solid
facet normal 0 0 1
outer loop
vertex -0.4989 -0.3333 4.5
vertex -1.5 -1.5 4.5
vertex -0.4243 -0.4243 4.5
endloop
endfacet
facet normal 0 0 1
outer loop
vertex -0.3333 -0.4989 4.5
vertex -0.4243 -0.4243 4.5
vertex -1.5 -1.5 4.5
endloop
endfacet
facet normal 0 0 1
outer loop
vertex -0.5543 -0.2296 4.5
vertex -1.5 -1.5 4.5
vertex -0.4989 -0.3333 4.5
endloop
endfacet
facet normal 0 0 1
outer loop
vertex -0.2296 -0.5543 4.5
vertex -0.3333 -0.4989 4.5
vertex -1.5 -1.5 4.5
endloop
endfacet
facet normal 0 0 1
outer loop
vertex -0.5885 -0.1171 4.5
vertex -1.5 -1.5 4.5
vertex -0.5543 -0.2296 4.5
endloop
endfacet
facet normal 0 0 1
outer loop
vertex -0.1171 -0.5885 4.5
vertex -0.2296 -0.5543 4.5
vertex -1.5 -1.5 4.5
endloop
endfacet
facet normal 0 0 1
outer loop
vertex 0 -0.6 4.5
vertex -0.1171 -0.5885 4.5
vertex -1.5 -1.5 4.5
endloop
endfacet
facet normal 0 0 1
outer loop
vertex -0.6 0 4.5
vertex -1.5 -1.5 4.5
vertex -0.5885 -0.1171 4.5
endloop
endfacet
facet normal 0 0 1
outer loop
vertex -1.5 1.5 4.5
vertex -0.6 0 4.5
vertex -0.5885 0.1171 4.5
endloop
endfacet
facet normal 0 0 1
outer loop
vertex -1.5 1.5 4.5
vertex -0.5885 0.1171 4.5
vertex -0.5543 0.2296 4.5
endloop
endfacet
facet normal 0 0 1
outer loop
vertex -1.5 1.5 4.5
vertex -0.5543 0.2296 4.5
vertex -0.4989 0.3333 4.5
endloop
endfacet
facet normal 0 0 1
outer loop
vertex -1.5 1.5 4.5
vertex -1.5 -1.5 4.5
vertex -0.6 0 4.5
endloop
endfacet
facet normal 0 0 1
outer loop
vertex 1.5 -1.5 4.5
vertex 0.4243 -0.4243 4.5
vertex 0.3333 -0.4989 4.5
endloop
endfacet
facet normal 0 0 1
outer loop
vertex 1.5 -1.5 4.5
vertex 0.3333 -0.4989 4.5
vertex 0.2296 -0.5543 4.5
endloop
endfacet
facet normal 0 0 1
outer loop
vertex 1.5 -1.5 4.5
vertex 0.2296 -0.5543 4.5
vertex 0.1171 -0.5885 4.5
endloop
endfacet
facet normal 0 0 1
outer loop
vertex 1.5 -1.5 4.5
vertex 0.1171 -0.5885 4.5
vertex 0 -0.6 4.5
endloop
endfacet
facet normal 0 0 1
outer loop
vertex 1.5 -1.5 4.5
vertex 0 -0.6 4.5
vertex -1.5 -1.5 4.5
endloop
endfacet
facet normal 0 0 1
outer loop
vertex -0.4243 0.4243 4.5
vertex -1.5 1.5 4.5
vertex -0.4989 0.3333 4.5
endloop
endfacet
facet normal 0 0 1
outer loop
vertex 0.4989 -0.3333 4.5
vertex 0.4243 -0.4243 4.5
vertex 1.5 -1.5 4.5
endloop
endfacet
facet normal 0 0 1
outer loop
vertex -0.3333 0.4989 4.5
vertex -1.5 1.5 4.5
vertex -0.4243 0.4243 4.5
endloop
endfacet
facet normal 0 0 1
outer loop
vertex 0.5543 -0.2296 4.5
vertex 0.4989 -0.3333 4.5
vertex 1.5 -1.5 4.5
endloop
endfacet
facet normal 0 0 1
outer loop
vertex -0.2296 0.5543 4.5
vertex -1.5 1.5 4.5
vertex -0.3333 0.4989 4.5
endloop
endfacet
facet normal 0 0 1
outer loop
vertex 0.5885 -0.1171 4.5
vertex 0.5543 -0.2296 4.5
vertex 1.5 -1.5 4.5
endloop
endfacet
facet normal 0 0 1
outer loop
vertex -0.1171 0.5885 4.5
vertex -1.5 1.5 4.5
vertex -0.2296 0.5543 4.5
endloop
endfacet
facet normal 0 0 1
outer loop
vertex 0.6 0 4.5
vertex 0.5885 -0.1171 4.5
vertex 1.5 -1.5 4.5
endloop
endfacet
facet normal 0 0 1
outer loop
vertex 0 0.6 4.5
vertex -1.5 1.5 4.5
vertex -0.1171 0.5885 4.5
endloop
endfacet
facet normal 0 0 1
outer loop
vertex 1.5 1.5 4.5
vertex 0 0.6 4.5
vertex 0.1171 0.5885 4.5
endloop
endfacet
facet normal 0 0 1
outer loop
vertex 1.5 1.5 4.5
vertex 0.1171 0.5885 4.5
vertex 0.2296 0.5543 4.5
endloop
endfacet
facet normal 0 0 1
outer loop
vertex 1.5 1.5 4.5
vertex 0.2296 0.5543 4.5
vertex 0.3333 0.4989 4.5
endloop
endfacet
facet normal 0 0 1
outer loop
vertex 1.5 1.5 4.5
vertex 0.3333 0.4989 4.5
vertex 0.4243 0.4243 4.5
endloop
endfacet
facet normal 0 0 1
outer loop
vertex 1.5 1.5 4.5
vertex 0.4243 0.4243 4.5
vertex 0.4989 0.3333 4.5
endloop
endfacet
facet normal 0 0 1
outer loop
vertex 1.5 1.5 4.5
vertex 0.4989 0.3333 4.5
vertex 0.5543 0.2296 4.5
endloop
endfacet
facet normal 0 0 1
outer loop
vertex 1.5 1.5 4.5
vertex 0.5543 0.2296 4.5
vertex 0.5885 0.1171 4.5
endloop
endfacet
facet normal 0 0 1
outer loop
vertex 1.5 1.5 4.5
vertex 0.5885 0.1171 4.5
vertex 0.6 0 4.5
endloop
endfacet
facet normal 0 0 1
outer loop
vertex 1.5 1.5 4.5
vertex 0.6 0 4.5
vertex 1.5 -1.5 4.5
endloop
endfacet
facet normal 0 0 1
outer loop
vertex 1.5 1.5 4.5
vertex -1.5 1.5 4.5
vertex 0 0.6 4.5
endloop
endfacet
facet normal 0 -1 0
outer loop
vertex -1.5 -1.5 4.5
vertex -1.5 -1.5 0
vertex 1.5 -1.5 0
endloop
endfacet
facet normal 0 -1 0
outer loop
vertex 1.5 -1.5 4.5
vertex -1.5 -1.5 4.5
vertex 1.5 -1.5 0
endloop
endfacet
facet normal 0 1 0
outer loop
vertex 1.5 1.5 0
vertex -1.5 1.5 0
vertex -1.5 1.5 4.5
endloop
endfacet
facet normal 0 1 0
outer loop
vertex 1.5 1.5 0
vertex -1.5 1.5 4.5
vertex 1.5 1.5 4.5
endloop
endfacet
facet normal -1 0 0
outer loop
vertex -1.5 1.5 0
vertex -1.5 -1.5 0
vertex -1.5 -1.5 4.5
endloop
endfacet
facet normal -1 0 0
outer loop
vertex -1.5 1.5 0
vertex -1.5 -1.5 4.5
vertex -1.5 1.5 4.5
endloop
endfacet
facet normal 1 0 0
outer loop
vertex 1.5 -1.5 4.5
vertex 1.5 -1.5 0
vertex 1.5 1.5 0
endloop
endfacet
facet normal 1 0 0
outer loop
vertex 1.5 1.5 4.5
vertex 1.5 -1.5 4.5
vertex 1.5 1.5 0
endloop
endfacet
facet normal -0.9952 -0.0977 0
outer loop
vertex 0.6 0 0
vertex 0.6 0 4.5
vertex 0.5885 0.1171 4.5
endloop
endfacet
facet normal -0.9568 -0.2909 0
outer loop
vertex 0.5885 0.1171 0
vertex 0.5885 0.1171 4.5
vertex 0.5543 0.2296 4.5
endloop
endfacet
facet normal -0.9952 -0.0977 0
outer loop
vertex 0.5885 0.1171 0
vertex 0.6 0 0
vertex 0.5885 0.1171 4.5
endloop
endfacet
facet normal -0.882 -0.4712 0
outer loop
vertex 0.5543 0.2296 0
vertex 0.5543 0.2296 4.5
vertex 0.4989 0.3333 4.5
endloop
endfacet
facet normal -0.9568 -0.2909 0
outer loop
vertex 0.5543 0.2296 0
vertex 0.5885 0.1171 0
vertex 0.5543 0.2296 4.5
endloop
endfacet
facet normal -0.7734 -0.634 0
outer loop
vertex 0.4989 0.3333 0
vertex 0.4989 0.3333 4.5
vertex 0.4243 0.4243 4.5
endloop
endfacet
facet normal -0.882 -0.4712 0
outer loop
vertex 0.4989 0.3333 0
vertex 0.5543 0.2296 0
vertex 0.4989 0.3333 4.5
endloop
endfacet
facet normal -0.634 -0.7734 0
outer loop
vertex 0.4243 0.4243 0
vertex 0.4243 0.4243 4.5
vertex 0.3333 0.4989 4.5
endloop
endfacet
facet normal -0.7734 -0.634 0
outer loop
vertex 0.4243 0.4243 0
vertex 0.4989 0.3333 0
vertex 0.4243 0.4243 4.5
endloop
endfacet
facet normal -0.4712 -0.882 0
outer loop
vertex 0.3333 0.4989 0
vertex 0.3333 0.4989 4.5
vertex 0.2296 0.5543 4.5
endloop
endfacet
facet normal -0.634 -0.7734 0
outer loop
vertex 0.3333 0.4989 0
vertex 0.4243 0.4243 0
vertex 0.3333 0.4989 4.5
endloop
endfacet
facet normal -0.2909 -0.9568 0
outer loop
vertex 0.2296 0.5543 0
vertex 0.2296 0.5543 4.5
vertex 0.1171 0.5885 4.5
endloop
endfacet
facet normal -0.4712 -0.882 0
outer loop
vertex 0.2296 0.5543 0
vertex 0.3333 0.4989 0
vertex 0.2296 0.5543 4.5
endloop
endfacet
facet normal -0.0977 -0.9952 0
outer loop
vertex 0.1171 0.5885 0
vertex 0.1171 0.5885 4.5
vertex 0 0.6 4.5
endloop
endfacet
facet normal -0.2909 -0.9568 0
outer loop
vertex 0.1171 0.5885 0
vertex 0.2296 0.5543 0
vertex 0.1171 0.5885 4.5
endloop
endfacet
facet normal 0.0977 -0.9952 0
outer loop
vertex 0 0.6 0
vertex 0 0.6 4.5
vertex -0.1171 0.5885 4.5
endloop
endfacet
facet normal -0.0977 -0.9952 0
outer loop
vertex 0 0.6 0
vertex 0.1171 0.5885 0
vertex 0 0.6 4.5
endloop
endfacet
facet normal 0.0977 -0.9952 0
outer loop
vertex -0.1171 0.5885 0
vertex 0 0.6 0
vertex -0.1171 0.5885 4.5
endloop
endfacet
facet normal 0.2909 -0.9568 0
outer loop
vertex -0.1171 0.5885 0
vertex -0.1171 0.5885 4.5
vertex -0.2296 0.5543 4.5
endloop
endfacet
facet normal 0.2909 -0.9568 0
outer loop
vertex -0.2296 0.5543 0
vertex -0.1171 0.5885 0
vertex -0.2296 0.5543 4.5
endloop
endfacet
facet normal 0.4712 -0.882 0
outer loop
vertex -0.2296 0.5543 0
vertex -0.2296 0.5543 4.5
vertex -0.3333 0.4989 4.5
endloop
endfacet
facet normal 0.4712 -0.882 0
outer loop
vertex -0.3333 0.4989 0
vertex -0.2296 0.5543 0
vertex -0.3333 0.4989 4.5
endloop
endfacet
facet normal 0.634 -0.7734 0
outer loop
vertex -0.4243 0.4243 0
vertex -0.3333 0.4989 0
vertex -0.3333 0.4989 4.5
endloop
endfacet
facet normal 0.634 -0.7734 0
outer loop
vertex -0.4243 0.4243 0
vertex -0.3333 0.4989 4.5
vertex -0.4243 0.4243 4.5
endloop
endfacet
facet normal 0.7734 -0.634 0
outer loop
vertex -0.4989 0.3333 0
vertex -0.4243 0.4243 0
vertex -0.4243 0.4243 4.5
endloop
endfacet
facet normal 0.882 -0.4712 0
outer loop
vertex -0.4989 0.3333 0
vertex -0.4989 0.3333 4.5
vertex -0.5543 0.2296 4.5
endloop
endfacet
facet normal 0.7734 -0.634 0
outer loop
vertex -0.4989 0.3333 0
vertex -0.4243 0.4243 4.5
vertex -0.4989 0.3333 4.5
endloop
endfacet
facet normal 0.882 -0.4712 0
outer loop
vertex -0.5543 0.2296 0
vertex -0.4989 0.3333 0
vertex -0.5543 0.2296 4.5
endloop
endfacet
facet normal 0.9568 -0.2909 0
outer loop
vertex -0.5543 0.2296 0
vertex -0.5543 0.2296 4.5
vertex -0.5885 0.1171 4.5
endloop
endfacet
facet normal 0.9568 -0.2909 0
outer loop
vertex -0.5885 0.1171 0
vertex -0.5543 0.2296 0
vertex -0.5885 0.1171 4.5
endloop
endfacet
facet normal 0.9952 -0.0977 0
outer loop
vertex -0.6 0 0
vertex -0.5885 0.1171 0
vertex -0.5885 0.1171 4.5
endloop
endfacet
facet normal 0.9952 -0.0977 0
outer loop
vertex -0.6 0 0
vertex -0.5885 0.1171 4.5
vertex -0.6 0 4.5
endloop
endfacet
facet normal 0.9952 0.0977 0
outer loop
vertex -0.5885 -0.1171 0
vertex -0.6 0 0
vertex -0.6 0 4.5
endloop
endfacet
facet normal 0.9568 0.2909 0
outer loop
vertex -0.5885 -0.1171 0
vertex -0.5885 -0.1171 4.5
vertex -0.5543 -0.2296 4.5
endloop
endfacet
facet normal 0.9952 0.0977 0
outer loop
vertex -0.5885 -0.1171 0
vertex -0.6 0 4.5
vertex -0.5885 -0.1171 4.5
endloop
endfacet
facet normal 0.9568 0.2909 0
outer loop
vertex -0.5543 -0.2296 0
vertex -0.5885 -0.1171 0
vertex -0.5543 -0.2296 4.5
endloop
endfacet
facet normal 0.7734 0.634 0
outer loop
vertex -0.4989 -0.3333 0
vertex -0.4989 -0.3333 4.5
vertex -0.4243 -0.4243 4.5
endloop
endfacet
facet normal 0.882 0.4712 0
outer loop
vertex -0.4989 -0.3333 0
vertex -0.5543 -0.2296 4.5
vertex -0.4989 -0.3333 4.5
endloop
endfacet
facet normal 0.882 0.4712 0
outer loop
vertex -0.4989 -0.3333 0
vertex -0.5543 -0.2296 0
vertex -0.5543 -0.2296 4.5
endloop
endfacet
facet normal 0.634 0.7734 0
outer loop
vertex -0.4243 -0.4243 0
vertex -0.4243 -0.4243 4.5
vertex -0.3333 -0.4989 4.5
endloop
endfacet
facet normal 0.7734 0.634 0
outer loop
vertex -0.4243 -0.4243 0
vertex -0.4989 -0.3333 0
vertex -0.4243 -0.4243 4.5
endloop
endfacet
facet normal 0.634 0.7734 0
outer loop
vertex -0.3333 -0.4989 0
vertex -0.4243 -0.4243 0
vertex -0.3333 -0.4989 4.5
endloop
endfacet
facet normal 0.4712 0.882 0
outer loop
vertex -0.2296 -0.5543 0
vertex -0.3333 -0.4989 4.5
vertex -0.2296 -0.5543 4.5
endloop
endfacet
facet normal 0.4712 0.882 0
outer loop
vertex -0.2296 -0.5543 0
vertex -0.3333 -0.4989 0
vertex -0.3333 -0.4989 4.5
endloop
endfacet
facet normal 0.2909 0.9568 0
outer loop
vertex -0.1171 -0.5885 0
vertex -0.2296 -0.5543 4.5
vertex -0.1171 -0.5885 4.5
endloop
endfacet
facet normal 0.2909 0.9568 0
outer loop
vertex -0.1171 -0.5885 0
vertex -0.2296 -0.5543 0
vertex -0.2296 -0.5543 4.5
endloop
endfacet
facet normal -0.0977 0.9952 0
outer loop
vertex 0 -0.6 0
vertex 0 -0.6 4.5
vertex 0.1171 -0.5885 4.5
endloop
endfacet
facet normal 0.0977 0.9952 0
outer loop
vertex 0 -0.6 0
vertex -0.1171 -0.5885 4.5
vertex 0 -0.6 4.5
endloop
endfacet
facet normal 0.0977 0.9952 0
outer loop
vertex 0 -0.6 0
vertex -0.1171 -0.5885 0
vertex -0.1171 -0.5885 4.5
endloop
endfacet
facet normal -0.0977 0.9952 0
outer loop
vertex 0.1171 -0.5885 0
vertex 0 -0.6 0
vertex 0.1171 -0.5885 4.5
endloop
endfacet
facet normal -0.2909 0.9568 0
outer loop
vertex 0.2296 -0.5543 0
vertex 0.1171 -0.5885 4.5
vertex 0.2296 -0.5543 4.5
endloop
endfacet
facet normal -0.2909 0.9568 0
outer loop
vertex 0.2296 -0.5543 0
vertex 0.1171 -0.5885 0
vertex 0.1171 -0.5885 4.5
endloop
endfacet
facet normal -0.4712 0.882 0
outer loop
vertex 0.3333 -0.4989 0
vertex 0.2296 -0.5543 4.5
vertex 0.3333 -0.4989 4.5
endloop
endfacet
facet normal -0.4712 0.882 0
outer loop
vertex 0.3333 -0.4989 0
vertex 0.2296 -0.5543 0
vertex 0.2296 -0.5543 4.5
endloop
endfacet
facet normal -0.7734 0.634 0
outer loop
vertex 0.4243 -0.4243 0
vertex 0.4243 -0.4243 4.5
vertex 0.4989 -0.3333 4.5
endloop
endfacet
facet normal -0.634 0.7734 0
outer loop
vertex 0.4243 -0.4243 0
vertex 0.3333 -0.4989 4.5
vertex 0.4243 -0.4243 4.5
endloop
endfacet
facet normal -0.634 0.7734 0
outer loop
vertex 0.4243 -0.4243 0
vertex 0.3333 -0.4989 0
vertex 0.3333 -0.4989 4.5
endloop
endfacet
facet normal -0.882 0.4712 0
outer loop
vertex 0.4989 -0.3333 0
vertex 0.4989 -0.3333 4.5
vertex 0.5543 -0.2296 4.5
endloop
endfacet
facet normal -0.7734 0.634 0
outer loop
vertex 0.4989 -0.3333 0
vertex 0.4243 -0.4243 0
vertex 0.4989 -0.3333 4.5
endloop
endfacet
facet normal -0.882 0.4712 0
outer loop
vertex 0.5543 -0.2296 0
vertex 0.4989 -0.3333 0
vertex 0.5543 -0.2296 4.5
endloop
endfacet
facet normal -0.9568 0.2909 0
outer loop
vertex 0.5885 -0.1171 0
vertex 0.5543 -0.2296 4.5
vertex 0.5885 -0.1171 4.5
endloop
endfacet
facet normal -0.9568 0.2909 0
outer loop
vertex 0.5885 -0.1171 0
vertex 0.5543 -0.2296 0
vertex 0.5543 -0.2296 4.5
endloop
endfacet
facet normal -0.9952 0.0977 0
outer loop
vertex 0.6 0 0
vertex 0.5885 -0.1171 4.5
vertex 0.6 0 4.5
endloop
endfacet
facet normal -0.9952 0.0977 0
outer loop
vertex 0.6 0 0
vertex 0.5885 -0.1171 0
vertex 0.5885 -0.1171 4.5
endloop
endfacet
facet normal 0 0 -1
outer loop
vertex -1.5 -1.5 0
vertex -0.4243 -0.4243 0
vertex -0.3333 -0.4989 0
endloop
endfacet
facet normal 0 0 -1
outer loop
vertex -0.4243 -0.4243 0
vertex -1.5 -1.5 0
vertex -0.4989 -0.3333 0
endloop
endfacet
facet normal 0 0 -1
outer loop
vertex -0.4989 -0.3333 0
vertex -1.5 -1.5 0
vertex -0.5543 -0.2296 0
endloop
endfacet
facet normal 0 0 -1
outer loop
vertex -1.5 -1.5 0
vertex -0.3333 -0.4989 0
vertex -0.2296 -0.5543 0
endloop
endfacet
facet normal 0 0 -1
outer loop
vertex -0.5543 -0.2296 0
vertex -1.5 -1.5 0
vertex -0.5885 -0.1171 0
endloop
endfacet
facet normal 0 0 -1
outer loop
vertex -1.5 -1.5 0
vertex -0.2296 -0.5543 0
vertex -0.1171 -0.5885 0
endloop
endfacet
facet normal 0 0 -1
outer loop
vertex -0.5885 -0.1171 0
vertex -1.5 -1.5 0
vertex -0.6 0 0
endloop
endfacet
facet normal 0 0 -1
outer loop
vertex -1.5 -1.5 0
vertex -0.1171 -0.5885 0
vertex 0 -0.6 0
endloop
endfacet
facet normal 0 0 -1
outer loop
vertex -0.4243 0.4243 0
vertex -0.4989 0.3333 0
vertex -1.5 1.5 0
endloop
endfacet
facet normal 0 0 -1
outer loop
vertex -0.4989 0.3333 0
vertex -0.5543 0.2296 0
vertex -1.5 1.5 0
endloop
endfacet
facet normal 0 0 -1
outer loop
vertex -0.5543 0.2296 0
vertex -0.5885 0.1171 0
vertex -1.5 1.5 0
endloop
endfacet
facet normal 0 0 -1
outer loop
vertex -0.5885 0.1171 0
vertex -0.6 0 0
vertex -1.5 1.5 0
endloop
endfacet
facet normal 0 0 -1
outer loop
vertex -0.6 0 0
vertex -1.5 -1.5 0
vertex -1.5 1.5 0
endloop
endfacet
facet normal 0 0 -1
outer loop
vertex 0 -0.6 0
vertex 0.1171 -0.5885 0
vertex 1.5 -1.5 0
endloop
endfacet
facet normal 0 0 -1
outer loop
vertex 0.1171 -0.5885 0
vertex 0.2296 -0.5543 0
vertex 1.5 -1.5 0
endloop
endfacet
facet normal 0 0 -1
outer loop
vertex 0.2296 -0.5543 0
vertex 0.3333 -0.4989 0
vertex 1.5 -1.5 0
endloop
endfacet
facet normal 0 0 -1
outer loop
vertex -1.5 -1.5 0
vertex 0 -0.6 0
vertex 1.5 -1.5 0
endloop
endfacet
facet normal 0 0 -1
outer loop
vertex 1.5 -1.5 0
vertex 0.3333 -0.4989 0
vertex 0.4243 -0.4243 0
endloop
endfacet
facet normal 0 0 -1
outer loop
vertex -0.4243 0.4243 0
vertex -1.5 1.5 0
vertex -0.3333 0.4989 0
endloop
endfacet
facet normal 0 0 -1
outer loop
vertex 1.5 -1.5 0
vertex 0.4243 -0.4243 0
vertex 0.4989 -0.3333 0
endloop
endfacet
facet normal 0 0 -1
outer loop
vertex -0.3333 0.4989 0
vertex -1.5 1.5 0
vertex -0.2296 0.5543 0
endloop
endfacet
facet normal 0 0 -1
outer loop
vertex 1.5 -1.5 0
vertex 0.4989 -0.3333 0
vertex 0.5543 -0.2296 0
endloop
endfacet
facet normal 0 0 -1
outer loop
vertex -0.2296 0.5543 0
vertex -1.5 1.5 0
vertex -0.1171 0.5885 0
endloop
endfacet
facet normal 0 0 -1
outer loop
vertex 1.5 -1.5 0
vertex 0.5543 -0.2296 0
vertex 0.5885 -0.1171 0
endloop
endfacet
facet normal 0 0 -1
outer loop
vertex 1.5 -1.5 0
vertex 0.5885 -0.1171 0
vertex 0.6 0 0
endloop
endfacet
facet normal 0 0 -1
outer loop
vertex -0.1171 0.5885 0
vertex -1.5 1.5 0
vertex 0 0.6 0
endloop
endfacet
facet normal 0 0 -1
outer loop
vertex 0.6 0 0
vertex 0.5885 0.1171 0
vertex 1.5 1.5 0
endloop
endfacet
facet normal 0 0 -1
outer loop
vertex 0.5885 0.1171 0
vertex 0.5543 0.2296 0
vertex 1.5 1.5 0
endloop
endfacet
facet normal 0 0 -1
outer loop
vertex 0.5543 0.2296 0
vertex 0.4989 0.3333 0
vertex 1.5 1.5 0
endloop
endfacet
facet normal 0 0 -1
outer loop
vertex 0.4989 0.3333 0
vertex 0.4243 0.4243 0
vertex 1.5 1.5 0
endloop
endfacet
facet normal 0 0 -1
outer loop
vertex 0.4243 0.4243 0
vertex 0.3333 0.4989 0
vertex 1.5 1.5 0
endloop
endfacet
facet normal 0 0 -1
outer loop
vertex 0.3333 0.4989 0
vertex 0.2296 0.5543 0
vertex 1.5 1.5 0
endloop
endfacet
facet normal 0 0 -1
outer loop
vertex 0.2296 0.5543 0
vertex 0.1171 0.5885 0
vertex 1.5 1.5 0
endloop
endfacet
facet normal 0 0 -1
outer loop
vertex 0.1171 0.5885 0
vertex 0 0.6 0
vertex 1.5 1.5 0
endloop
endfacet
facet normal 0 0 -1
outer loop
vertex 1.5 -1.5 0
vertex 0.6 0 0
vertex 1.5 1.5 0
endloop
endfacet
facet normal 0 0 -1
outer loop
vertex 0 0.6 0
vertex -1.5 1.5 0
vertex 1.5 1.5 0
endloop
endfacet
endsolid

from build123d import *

# Parameters (mm, degrees)
CYLINDER_R     = 0.6
CYLINDER_DEPTH = 10
BOX008_W       = 3
BOX008_H       = 3
BOX008_DEPTH   = 4.5


with BuildPart() as hole:
    # Cylinder → Cylinder (new body)
    with BuildSketch(Plane.XY):
        Circle(CYLINDER_R)
    extrude(amount=CYLINDER_DEPTH)


with BuildPart() as stand_hole_cut:
    # Box008 → Box008 (new body)
    with BuildSketch(Plane(origin=(-1.5, -1.5, 0), x_dir=(1, 0, 0), z_dir=(0, 0, 1))):
        with Locations((1.5, 1.5)):
            Rectangle(BOX008_W, BOX008_H)
    extrude(amount=BOX008_DEPTH)

    # Cut003002: cut hole
    add(hole.part, mode=Mode.SUBTRACT)


solid = stand_hole_cut.part
